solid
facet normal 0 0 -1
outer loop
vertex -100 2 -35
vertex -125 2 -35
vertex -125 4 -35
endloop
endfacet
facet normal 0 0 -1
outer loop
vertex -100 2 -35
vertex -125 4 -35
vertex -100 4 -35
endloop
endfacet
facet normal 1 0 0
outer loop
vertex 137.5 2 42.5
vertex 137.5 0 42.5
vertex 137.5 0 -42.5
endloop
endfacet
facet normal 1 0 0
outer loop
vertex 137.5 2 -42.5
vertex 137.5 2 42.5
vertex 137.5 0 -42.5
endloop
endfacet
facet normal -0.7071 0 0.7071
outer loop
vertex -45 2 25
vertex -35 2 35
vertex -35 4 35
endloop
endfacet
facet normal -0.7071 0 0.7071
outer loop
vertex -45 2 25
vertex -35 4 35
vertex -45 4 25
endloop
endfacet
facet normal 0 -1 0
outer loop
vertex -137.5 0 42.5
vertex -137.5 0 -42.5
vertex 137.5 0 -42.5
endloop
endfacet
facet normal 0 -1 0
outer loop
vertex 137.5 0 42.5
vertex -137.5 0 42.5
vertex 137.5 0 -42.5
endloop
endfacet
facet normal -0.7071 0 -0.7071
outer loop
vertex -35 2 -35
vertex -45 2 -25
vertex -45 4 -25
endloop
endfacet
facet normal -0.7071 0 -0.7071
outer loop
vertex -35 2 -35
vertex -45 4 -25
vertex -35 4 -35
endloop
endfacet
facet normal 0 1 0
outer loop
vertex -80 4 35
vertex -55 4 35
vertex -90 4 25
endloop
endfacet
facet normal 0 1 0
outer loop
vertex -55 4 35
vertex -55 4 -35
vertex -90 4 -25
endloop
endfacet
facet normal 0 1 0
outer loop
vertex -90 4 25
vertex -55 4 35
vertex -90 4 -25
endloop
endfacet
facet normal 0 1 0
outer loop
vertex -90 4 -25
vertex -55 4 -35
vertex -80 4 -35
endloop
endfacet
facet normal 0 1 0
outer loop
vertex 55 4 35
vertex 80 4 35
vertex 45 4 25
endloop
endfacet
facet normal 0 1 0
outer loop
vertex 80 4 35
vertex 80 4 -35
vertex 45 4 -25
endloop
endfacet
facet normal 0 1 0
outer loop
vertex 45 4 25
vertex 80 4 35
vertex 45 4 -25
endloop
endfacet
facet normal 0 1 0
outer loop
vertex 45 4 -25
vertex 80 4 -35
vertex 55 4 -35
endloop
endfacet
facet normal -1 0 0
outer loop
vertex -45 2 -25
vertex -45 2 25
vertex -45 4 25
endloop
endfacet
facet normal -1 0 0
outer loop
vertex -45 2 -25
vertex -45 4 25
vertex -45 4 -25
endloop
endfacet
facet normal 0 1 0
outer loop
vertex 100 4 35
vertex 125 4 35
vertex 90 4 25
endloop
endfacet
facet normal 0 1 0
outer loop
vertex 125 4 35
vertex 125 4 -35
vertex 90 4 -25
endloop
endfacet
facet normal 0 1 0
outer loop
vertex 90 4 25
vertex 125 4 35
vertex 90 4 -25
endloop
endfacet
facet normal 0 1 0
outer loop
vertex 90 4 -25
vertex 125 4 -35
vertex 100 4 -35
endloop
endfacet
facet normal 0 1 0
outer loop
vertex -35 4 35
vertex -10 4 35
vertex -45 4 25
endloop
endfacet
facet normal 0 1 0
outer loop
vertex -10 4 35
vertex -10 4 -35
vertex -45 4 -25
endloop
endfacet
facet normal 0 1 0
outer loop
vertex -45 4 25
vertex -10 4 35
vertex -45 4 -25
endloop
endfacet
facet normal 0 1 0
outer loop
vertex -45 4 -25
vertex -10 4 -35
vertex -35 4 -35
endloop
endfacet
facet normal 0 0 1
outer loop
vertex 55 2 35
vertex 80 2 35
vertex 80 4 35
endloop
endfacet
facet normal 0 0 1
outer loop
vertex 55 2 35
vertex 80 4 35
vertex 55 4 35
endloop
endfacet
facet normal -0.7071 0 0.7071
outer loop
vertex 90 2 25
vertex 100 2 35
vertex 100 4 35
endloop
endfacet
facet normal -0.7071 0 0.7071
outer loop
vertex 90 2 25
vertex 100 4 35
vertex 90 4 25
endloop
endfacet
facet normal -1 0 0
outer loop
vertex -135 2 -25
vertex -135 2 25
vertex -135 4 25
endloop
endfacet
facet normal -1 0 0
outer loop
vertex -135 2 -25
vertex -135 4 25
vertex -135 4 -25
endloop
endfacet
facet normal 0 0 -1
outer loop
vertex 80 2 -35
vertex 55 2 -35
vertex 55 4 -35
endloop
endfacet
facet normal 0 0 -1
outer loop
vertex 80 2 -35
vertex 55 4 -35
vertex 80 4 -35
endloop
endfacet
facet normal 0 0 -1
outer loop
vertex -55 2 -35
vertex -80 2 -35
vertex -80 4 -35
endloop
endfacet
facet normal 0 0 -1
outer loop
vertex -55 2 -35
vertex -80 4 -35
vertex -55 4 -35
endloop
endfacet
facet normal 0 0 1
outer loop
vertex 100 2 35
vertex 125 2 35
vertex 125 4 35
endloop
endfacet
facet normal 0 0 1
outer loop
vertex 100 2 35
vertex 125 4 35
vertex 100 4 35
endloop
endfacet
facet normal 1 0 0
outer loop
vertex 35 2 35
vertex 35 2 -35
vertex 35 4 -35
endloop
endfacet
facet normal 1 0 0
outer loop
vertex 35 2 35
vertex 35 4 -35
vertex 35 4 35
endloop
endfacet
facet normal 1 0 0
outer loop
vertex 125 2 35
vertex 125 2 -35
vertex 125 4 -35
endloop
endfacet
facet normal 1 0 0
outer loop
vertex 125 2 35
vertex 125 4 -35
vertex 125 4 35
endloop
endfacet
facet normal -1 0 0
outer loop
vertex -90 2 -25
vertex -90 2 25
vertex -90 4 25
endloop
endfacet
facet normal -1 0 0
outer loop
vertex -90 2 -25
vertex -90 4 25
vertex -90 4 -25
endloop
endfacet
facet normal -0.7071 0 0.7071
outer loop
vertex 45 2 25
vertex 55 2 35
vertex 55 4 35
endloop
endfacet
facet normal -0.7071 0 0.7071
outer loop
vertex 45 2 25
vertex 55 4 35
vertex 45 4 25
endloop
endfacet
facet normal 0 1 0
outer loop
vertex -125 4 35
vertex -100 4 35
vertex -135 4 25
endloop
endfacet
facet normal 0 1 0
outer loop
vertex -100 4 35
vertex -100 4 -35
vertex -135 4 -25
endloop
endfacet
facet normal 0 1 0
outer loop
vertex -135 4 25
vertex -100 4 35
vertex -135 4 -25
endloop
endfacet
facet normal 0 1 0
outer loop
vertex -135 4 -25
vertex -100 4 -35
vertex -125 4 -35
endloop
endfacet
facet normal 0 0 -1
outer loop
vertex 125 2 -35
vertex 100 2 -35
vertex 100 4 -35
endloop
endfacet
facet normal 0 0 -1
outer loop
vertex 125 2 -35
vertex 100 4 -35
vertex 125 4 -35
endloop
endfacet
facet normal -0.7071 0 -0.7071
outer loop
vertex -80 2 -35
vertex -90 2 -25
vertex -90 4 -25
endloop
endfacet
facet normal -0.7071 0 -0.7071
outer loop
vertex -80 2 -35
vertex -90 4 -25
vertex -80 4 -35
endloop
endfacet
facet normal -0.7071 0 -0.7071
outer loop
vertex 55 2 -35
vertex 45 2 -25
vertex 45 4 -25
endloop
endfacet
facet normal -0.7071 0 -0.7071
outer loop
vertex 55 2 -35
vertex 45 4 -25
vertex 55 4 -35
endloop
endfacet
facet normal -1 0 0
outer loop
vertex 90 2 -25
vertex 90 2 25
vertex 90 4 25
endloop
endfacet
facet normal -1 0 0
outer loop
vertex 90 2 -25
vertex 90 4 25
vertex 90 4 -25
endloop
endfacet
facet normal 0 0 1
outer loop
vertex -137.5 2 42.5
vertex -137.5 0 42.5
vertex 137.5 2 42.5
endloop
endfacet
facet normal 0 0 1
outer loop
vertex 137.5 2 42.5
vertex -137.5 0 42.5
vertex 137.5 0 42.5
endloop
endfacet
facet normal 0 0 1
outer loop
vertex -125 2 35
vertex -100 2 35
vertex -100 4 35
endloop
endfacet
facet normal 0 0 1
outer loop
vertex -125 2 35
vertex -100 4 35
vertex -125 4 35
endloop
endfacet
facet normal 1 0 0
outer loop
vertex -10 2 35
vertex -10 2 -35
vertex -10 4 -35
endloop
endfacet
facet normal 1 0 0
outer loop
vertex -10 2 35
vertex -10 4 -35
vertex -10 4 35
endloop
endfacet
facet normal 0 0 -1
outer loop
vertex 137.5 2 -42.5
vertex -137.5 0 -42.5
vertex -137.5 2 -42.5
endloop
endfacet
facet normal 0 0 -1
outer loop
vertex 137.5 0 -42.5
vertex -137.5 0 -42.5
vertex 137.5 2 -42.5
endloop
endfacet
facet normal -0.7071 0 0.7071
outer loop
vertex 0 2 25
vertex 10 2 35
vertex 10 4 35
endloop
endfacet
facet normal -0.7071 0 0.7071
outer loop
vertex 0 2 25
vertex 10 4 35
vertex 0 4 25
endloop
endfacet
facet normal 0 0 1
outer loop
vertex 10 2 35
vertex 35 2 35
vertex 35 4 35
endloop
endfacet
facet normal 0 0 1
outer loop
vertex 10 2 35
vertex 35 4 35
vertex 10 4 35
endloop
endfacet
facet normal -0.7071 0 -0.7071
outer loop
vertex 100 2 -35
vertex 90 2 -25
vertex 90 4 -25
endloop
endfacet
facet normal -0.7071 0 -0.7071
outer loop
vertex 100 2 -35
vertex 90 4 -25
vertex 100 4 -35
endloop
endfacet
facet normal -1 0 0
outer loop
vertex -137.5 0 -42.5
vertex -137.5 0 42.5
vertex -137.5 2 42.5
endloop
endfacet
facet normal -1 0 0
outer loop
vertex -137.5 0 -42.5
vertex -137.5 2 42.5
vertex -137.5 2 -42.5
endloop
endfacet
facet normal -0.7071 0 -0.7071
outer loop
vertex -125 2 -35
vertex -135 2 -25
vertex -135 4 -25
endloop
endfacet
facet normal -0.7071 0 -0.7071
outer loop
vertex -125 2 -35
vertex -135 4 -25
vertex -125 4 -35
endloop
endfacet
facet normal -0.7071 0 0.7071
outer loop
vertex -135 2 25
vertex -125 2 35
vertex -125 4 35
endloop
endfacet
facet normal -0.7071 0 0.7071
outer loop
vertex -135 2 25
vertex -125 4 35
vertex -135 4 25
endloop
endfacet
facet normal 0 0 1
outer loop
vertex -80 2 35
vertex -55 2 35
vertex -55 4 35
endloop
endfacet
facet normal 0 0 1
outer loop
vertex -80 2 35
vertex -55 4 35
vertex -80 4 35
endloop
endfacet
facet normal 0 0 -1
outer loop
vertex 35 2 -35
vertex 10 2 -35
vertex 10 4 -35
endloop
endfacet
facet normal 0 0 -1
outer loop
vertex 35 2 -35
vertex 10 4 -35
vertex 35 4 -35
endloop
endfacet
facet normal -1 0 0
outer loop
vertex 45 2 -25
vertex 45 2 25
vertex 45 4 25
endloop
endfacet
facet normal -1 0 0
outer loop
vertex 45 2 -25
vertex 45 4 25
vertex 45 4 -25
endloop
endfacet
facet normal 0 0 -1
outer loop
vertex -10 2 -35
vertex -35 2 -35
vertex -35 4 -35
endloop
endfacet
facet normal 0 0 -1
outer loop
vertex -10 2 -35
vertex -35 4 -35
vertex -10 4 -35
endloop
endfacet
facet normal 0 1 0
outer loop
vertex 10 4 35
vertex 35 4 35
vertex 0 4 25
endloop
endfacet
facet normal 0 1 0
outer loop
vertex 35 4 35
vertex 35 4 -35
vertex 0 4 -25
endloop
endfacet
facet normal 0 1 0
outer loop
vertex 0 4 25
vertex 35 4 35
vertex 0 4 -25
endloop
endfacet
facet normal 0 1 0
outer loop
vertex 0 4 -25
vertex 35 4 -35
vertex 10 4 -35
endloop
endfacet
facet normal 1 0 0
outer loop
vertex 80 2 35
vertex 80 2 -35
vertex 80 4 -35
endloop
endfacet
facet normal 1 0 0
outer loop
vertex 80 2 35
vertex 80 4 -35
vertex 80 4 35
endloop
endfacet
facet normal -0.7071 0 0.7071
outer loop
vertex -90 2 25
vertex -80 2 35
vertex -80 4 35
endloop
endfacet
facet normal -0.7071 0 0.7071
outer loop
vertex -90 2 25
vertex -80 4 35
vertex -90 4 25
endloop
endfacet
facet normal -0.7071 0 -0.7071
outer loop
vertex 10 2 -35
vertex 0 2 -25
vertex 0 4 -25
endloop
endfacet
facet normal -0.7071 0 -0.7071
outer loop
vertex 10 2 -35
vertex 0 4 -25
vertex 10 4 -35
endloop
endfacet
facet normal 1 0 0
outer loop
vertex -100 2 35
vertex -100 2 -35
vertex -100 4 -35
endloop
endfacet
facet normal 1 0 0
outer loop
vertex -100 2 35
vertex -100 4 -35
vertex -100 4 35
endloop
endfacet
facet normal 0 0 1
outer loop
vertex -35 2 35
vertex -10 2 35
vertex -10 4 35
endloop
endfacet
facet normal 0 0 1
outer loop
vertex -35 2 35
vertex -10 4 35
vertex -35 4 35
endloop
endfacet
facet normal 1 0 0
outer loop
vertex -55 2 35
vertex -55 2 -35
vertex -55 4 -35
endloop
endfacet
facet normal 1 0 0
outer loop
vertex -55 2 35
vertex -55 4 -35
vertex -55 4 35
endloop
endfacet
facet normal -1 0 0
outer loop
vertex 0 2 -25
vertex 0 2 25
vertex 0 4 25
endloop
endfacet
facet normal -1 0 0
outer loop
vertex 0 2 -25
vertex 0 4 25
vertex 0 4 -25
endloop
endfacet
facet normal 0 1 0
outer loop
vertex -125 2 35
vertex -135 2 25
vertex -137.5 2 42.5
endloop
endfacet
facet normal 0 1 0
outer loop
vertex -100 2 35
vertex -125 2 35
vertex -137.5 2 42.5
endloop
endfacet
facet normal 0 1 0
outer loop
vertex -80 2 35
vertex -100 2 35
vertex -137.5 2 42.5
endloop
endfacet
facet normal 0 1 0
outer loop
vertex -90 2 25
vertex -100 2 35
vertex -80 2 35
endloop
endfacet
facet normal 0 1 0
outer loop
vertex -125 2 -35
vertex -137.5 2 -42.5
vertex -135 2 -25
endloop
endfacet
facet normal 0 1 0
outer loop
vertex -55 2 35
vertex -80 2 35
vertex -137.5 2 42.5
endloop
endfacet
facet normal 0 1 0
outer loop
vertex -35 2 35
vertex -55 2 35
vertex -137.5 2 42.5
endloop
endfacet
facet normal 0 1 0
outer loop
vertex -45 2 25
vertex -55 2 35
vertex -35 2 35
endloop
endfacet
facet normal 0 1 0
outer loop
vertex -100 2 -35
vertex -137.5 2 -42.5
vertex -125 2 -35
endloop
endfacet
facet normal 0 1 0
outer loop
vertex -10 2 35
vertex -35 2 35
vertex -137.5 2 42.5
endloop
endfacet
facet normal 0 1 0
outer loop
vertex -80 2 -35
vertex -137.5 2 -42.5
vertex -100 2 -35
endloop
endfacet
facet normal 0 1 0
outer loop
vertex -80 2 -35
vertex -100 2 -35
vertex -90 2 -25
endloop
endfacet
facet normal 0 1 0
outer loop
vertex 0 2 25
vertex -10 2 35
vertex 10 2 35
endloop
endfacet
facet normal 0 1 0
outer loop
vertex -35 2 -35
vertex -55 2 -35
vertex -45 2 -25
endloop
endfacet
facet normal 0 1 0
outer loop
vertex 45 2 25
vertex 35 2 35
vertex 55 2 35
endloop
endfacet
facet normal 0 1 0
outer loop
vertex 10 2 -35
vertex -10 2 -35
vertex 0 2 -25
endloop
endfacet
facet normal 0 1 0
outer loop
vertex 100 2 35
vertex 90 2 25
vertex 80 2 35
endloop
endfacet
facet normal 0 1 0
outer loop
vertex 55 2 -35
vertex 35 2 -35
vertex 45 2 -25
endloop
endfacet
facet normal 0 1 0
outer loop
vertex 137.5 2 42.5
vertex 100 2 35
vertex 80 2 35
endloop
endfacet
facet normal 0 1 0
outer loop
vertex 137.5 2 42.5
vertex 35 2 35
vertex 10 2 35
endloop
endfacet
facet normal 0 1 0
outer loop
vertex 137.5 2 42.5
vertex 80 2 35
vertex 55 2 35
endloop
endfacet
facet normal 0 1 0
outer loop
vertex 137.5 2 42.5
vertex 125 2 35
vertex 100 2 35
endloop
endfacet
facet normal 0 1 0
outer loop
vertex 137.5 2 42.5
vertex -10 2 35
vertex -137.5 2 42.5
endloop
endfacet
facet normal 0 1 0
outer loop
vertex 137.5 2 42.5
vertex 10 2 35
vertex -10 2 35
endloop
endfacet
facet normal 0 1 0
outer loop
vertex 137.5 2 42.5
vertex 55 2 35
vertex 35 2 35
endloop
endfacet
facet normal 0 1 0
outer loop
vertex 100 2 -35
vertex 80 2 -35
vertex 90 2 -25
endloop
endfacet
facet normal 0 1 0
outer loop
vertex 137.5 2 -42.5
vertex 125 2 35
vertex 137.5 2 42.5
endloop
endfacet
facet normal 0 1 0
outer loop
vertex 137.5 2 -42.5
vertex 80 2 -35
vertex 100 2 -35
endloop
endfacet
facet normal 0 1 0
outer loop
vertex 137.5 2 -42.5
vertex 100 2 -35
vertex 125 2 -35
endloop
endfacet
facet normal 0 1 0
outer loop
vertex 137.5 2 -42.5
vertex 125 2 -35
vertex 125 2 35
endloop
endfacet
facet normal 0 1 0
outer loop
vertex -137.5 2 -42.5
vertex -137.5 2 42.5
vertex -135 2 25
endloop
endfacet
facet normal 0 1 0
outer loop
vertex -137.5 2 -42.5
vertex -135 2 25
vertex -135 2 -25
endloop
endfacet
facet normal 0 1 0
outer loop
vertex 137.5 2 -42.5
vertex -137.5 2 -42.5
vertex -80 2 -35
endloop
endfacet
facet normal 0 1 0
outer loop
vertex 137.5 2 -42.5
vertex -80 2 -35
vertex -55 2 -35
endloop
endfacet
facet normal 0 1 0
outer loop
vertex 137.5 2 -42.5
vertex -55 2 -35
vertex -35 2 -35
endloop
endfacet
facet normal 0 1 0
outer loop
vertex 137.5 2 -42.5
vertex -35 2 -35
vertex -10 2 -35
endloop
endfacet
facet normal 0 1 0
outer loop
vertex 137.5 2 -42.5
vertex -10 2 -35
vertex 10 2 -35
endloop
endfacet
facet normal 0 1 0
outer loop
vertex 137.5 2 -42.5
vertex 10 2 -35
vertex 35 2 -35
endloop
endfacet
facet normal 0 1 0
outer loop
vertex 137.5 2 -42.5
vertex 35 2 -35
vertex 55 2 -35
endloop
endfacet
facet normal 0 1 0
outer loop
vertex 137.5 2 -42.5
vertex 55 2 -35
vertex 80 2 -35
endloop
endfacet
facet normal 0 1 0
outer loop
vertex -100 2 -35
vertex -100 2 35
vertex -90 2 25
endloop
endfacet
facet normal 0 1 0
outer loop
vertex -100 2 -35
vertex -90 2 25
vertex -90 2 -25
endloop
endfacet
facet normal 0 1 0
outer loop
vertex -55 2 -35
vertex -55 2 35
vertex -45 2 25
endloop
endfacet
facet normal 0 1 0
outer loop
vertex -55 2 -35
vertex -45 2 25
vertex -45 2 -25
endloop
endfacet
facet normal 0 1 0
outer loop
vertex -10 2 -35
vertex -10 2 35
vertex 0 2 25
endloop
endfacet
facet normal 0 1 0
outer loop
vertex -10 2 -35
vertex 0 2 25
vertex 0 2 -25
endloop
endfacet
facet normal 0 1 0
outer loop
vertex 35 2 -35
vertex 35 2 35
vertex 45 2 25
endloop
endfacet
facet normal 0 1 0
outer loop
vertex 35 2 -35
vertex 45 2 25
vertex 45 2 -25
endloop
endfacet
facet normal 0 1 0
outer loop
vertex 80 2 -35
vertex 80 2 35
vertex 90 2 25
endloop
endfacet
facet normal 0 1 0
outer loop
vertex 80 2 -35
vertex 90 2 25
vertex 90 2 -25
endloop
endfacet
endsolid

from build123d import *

# Parameters (mm, degrees)
SKETCH1_W           = 275
SKETCH1_H           = 85
BOSS_EXTRUDE1_DEPTH = 2
BOSS_EXTRUDE2_DEPTH = 2


with BuildPart() as part:
    # Sketch1 → Boss-Extrude1 (new body)
    with BuildSketch(Plane(origin=(0, 0, 0), x_dir=(1, 0, 0), z_dir=(0, 1, 0))):
        Rectangle(SKETCH1_W, SKETCH1_H)
    extrude(amount=BOSS_EXTRUDE1_DEPTH)

    # Sketch2 → Boss-Extrude2 (add)
    with BuildSketch(Plane(origin=(0, 2, 0), x_dir=(1, 0, 0), z_dir=(0, 1, 0))):
        Polygon((-100, 35), (-100, -35), (-125, -35), (-135, -25), (-135, 25), (-125, 35), align=None)
        Polygon((-90, 25), (-80, 35), (-55, 35), (-55, -35), (-80, -35), (-90, -25), align=None)
        Polygon((-45, 25), (-35, 35), (-10, 35), (-10, -35), (-35, -35), (-45, -25), align=None)
        Polygon((0, 25), (10, 35), (35, 35), (35, -35), (10, -35), (0, -25), align=None)
        Polygon((45, 25), (55, 35), (80, 35), (80, -35), (55, -35), (45, -25), align=None)
        Polygon((90, 25), (100, 35), (125, 35), (125, -35), (100, -35), (90, -25), align=None)
    extrude(amount=BOSS_EXTRUDE2_DEPTH)


solid = part.part
